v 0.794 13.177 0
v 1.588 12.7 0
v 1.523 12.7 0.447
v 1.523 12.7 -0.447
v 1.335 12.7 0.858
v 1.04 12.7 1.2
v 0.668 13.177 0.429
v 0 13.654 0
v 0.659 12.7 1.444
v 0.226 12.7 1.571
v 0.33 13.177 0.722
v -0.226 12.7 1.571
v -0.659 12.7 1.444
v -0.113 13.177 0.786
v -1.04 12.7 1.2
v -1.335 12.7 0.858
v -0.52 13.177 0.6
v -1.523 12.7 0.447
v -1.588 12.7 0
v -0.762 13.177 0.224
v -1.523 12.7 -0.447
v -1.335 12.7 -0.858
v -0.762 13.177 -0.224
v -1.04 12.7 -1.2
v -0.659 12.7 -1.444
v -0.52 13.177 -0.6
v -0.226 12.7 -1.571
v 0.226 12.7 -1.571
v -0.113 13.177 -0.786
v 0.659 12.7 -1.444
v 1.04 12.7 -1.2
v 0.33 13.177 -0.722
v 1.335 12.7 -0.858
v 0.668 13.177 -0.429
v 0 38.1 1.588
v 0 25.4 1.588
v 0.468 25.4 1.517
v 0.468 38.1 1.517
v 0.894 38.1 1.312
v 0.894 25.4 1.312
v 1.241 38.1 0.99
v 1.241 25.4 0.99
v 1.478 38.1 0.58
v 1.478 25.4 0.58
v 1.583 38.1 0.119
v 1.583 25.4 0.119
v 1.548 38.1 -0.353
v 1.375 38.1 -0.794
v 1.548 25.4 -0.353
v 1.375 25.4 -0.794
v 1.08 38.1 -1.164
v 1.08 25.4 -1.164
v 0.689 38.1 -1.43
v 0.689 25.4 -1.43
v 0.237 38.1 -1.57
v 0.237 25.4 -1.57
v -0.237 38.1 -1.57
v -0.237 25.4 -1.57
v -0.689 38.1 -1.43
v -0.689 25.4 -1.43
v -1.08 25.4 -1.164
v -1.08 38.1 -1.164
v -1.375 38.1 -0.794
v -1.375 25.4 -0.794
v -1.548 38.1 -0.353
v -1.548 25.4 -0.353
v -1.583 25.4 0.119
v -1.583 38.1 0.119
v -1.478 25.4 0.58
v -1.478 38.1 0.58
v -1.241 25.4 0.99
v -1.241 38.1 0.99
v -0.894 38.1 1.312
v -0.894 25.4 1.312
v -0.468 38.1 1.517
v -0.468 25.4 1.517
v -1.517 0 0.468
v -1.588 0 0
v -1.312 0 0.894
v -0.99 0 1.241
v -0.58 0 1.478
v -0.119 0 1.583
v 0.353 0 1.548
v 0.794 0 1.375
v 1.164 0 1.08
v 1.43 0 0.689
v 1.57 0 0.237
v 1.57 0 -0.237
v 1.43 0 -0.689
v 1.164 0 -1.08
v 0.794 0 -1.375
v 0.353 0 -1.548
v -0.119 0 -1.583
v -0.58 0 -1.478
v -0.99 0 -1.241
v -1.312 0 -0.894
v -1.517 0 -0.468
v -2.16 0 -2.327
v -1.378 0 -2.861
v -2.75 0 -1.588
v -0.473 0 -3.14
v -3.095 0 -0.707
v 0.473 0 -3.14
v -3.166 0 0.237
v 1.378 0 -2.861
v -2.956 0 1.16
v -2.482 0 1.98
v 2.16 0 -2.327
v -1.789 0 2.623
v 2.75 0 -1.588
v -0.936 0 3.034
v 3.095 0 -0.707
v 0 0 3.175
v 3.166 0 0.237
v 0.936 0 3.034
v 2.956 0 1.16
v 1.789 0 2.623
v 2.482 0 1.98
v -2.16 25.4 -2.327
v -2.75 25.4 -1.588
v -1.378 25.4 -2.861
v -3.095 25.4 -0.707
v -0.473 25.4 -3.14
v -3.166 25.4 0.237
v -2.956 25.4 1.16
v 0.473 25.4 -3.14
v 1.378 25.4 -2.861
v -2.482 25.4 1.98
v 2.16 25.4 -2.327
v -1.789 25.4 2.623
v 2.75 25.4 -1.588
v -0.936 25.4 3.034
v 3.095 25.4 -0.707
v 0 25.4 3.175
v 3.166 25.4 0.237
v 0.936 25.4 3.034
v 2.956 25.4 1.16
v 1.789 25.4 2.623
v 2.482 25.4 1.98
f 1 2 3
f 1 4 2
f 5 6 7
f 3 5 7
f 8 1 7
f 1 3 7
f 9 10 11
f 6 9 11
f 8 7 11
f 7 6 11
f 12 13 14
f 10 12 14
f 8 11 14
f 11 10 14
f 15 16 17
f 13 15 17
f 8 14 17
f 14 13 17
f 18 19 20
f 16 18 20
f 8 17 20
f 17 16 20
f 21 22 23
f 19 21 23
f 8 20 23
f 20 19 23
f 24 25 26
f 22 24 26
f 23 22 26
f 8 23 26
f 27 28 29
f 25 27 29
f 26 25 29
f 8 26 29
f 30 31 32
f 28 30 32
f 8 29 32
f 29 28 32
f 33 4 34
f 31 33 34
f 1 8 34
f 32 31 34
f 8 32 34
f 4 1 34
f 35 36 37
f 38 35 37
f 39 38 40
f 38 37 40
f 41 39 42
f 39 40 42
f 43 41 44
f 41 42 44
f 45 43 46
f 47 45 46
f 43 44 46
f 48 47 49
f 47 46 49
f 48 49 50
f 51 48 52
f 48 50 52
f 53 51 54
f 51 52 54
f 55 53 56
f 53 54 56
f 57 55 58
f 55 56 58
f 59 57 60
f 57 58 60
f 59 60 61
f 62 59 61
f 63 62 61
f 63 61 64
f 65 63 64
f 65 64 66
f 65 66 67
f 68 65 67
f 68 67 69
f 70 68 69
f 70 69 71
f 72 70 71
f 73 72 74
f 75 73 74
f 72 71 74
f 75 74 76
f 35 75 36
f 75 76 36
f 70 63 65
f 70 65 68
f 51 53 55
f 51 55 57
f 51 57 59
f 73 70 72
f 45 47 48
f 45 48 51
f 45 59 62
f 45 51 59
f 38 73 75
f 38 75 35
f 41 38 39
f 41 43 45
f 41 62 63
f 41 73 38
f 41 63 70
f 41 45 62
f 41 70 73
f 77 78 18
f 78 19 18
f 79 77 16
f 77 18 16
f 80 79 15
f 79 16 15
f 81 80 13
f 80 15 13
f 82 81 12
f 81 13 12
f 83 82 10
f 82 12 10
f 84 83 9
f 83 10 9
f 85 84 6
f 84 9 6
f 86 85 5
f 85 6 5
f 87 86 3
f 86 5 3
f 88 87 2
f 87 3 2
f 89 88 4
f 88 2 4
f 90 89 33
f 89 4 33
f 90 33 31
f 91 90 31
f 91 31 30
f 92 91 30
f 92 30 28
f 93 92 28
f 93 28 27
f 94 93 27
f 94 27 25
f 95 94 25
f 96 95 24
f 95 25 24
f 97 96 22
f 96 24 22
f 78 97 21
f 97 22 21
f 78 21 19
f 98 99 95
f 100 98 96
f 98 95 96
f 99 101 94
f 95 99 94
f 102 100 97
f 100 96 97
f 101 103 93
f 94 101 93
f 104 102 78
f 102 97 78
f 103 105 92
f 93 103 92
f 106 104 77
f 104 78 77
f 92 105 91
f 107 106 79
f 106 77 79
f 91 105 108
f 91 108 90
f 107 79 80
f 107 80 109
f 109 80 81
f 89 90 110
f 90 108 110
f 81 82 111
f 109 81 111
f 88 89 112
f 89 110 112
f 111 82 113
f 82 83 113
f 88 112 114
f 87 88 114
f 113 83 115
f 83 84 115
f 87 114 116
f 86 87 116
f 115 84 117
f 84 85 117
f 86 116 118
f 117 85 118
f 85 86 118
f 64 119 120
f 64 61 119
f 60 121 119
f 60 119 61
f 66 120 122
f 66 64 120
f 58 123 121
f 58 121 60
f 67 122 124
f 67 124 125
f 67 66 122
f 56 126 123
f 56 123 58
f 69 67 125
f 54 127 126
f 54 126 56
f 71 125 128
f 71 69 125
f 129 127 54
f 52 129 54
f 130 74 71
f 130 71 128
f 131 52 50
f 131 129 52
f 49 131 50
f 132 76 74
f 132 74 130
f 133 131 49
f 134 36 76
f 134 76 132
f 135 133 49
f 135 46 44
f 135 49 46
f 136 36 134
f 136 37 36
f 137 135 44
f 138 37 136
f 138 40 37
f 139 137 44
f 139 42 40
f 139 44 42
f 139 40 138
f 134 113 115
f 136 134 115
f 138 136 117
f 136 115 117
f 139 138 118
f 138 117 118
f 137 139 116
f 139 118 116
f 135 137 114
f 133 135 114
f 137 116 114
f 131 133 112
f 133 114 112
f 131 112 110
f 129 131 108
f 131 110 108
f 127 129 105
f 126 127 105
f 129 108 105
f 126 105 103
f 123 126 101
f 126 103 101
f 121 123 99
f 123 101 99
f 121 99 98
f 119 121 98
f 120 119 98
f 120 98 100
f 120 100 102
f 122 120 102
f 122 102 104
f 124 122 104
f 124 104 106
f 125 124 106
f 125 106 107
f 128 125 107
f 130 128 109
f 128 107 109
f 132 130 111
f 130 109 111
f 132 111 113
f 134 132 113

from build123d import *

# Parameters (mm, degrees)
SKETCH1_R                        = 3.175
BOSS_EXTRUDE1_DEPTH              = 25.4
SKETCH2_R                        = 1.5875
BOSS_EXTRUDE2_DEPTH              = 12.7
F_1_8_0_125_DIAMETER_HOLE1_D     = 3.175
F_1_8_0_125_DIAMETER_HOLE1_DEPTH = 12.7
F_1_8_0_125_DIAMETER_HOLE1_TIP   = 0.953866233


with BuildPart() as part:
    # Sketch1 → Boss-Extrude1 (new body)
    with BuildSketch(Plane(origin=(0, 0, 0), x_dir=(1, 0, 0), z_dir=(0, 1, 0))):
        with Locations(Location((0, 0, 0), (0, 0, 270))):
            Circle(SKETCH1_R)
    extrude(amount=BOSS_EXTRUDE1_DEPTH)

    # Sketch2 → Boss-Extrude2 (add)
    with BuildSketch(Plane(origin=(0, 25.4, 0), x_dir=(1, 0, 0), z_dir=(0, 1, 0))):
        with Locations(Location((0, 0, 0), (0, 0, 270))):
            Circle(SKETCH2_R)
    extrude(amount=BOSS_EXTRUDE2_DEPTH)

    # 1/8 (0.125) Diameter Hole1
    with Locations(Plane.XZ):
        with Locations((0, 0)):
            Hole(F_1_8_0_125_DIAMETER_HOLE1_D / 2, depth=F_1_8_0_125_DIAMETER_HOLE1_DEPTH)
            with Locations((0, 0, -(F_1_8_0_125_DIAMETER_HOLE1_DEPTH + F_1_8_0_125_DIAMETER_HOLE1_TIP / 2))):  # 118° drill point
                Cone(0, F_1_8_0_125_DIAMETER_HOLE1_D / 2, F_1_8_0_125_DIAMETER_HOLE1_TIP, mode=Mode.SUBTRACT)


solid = part.part
